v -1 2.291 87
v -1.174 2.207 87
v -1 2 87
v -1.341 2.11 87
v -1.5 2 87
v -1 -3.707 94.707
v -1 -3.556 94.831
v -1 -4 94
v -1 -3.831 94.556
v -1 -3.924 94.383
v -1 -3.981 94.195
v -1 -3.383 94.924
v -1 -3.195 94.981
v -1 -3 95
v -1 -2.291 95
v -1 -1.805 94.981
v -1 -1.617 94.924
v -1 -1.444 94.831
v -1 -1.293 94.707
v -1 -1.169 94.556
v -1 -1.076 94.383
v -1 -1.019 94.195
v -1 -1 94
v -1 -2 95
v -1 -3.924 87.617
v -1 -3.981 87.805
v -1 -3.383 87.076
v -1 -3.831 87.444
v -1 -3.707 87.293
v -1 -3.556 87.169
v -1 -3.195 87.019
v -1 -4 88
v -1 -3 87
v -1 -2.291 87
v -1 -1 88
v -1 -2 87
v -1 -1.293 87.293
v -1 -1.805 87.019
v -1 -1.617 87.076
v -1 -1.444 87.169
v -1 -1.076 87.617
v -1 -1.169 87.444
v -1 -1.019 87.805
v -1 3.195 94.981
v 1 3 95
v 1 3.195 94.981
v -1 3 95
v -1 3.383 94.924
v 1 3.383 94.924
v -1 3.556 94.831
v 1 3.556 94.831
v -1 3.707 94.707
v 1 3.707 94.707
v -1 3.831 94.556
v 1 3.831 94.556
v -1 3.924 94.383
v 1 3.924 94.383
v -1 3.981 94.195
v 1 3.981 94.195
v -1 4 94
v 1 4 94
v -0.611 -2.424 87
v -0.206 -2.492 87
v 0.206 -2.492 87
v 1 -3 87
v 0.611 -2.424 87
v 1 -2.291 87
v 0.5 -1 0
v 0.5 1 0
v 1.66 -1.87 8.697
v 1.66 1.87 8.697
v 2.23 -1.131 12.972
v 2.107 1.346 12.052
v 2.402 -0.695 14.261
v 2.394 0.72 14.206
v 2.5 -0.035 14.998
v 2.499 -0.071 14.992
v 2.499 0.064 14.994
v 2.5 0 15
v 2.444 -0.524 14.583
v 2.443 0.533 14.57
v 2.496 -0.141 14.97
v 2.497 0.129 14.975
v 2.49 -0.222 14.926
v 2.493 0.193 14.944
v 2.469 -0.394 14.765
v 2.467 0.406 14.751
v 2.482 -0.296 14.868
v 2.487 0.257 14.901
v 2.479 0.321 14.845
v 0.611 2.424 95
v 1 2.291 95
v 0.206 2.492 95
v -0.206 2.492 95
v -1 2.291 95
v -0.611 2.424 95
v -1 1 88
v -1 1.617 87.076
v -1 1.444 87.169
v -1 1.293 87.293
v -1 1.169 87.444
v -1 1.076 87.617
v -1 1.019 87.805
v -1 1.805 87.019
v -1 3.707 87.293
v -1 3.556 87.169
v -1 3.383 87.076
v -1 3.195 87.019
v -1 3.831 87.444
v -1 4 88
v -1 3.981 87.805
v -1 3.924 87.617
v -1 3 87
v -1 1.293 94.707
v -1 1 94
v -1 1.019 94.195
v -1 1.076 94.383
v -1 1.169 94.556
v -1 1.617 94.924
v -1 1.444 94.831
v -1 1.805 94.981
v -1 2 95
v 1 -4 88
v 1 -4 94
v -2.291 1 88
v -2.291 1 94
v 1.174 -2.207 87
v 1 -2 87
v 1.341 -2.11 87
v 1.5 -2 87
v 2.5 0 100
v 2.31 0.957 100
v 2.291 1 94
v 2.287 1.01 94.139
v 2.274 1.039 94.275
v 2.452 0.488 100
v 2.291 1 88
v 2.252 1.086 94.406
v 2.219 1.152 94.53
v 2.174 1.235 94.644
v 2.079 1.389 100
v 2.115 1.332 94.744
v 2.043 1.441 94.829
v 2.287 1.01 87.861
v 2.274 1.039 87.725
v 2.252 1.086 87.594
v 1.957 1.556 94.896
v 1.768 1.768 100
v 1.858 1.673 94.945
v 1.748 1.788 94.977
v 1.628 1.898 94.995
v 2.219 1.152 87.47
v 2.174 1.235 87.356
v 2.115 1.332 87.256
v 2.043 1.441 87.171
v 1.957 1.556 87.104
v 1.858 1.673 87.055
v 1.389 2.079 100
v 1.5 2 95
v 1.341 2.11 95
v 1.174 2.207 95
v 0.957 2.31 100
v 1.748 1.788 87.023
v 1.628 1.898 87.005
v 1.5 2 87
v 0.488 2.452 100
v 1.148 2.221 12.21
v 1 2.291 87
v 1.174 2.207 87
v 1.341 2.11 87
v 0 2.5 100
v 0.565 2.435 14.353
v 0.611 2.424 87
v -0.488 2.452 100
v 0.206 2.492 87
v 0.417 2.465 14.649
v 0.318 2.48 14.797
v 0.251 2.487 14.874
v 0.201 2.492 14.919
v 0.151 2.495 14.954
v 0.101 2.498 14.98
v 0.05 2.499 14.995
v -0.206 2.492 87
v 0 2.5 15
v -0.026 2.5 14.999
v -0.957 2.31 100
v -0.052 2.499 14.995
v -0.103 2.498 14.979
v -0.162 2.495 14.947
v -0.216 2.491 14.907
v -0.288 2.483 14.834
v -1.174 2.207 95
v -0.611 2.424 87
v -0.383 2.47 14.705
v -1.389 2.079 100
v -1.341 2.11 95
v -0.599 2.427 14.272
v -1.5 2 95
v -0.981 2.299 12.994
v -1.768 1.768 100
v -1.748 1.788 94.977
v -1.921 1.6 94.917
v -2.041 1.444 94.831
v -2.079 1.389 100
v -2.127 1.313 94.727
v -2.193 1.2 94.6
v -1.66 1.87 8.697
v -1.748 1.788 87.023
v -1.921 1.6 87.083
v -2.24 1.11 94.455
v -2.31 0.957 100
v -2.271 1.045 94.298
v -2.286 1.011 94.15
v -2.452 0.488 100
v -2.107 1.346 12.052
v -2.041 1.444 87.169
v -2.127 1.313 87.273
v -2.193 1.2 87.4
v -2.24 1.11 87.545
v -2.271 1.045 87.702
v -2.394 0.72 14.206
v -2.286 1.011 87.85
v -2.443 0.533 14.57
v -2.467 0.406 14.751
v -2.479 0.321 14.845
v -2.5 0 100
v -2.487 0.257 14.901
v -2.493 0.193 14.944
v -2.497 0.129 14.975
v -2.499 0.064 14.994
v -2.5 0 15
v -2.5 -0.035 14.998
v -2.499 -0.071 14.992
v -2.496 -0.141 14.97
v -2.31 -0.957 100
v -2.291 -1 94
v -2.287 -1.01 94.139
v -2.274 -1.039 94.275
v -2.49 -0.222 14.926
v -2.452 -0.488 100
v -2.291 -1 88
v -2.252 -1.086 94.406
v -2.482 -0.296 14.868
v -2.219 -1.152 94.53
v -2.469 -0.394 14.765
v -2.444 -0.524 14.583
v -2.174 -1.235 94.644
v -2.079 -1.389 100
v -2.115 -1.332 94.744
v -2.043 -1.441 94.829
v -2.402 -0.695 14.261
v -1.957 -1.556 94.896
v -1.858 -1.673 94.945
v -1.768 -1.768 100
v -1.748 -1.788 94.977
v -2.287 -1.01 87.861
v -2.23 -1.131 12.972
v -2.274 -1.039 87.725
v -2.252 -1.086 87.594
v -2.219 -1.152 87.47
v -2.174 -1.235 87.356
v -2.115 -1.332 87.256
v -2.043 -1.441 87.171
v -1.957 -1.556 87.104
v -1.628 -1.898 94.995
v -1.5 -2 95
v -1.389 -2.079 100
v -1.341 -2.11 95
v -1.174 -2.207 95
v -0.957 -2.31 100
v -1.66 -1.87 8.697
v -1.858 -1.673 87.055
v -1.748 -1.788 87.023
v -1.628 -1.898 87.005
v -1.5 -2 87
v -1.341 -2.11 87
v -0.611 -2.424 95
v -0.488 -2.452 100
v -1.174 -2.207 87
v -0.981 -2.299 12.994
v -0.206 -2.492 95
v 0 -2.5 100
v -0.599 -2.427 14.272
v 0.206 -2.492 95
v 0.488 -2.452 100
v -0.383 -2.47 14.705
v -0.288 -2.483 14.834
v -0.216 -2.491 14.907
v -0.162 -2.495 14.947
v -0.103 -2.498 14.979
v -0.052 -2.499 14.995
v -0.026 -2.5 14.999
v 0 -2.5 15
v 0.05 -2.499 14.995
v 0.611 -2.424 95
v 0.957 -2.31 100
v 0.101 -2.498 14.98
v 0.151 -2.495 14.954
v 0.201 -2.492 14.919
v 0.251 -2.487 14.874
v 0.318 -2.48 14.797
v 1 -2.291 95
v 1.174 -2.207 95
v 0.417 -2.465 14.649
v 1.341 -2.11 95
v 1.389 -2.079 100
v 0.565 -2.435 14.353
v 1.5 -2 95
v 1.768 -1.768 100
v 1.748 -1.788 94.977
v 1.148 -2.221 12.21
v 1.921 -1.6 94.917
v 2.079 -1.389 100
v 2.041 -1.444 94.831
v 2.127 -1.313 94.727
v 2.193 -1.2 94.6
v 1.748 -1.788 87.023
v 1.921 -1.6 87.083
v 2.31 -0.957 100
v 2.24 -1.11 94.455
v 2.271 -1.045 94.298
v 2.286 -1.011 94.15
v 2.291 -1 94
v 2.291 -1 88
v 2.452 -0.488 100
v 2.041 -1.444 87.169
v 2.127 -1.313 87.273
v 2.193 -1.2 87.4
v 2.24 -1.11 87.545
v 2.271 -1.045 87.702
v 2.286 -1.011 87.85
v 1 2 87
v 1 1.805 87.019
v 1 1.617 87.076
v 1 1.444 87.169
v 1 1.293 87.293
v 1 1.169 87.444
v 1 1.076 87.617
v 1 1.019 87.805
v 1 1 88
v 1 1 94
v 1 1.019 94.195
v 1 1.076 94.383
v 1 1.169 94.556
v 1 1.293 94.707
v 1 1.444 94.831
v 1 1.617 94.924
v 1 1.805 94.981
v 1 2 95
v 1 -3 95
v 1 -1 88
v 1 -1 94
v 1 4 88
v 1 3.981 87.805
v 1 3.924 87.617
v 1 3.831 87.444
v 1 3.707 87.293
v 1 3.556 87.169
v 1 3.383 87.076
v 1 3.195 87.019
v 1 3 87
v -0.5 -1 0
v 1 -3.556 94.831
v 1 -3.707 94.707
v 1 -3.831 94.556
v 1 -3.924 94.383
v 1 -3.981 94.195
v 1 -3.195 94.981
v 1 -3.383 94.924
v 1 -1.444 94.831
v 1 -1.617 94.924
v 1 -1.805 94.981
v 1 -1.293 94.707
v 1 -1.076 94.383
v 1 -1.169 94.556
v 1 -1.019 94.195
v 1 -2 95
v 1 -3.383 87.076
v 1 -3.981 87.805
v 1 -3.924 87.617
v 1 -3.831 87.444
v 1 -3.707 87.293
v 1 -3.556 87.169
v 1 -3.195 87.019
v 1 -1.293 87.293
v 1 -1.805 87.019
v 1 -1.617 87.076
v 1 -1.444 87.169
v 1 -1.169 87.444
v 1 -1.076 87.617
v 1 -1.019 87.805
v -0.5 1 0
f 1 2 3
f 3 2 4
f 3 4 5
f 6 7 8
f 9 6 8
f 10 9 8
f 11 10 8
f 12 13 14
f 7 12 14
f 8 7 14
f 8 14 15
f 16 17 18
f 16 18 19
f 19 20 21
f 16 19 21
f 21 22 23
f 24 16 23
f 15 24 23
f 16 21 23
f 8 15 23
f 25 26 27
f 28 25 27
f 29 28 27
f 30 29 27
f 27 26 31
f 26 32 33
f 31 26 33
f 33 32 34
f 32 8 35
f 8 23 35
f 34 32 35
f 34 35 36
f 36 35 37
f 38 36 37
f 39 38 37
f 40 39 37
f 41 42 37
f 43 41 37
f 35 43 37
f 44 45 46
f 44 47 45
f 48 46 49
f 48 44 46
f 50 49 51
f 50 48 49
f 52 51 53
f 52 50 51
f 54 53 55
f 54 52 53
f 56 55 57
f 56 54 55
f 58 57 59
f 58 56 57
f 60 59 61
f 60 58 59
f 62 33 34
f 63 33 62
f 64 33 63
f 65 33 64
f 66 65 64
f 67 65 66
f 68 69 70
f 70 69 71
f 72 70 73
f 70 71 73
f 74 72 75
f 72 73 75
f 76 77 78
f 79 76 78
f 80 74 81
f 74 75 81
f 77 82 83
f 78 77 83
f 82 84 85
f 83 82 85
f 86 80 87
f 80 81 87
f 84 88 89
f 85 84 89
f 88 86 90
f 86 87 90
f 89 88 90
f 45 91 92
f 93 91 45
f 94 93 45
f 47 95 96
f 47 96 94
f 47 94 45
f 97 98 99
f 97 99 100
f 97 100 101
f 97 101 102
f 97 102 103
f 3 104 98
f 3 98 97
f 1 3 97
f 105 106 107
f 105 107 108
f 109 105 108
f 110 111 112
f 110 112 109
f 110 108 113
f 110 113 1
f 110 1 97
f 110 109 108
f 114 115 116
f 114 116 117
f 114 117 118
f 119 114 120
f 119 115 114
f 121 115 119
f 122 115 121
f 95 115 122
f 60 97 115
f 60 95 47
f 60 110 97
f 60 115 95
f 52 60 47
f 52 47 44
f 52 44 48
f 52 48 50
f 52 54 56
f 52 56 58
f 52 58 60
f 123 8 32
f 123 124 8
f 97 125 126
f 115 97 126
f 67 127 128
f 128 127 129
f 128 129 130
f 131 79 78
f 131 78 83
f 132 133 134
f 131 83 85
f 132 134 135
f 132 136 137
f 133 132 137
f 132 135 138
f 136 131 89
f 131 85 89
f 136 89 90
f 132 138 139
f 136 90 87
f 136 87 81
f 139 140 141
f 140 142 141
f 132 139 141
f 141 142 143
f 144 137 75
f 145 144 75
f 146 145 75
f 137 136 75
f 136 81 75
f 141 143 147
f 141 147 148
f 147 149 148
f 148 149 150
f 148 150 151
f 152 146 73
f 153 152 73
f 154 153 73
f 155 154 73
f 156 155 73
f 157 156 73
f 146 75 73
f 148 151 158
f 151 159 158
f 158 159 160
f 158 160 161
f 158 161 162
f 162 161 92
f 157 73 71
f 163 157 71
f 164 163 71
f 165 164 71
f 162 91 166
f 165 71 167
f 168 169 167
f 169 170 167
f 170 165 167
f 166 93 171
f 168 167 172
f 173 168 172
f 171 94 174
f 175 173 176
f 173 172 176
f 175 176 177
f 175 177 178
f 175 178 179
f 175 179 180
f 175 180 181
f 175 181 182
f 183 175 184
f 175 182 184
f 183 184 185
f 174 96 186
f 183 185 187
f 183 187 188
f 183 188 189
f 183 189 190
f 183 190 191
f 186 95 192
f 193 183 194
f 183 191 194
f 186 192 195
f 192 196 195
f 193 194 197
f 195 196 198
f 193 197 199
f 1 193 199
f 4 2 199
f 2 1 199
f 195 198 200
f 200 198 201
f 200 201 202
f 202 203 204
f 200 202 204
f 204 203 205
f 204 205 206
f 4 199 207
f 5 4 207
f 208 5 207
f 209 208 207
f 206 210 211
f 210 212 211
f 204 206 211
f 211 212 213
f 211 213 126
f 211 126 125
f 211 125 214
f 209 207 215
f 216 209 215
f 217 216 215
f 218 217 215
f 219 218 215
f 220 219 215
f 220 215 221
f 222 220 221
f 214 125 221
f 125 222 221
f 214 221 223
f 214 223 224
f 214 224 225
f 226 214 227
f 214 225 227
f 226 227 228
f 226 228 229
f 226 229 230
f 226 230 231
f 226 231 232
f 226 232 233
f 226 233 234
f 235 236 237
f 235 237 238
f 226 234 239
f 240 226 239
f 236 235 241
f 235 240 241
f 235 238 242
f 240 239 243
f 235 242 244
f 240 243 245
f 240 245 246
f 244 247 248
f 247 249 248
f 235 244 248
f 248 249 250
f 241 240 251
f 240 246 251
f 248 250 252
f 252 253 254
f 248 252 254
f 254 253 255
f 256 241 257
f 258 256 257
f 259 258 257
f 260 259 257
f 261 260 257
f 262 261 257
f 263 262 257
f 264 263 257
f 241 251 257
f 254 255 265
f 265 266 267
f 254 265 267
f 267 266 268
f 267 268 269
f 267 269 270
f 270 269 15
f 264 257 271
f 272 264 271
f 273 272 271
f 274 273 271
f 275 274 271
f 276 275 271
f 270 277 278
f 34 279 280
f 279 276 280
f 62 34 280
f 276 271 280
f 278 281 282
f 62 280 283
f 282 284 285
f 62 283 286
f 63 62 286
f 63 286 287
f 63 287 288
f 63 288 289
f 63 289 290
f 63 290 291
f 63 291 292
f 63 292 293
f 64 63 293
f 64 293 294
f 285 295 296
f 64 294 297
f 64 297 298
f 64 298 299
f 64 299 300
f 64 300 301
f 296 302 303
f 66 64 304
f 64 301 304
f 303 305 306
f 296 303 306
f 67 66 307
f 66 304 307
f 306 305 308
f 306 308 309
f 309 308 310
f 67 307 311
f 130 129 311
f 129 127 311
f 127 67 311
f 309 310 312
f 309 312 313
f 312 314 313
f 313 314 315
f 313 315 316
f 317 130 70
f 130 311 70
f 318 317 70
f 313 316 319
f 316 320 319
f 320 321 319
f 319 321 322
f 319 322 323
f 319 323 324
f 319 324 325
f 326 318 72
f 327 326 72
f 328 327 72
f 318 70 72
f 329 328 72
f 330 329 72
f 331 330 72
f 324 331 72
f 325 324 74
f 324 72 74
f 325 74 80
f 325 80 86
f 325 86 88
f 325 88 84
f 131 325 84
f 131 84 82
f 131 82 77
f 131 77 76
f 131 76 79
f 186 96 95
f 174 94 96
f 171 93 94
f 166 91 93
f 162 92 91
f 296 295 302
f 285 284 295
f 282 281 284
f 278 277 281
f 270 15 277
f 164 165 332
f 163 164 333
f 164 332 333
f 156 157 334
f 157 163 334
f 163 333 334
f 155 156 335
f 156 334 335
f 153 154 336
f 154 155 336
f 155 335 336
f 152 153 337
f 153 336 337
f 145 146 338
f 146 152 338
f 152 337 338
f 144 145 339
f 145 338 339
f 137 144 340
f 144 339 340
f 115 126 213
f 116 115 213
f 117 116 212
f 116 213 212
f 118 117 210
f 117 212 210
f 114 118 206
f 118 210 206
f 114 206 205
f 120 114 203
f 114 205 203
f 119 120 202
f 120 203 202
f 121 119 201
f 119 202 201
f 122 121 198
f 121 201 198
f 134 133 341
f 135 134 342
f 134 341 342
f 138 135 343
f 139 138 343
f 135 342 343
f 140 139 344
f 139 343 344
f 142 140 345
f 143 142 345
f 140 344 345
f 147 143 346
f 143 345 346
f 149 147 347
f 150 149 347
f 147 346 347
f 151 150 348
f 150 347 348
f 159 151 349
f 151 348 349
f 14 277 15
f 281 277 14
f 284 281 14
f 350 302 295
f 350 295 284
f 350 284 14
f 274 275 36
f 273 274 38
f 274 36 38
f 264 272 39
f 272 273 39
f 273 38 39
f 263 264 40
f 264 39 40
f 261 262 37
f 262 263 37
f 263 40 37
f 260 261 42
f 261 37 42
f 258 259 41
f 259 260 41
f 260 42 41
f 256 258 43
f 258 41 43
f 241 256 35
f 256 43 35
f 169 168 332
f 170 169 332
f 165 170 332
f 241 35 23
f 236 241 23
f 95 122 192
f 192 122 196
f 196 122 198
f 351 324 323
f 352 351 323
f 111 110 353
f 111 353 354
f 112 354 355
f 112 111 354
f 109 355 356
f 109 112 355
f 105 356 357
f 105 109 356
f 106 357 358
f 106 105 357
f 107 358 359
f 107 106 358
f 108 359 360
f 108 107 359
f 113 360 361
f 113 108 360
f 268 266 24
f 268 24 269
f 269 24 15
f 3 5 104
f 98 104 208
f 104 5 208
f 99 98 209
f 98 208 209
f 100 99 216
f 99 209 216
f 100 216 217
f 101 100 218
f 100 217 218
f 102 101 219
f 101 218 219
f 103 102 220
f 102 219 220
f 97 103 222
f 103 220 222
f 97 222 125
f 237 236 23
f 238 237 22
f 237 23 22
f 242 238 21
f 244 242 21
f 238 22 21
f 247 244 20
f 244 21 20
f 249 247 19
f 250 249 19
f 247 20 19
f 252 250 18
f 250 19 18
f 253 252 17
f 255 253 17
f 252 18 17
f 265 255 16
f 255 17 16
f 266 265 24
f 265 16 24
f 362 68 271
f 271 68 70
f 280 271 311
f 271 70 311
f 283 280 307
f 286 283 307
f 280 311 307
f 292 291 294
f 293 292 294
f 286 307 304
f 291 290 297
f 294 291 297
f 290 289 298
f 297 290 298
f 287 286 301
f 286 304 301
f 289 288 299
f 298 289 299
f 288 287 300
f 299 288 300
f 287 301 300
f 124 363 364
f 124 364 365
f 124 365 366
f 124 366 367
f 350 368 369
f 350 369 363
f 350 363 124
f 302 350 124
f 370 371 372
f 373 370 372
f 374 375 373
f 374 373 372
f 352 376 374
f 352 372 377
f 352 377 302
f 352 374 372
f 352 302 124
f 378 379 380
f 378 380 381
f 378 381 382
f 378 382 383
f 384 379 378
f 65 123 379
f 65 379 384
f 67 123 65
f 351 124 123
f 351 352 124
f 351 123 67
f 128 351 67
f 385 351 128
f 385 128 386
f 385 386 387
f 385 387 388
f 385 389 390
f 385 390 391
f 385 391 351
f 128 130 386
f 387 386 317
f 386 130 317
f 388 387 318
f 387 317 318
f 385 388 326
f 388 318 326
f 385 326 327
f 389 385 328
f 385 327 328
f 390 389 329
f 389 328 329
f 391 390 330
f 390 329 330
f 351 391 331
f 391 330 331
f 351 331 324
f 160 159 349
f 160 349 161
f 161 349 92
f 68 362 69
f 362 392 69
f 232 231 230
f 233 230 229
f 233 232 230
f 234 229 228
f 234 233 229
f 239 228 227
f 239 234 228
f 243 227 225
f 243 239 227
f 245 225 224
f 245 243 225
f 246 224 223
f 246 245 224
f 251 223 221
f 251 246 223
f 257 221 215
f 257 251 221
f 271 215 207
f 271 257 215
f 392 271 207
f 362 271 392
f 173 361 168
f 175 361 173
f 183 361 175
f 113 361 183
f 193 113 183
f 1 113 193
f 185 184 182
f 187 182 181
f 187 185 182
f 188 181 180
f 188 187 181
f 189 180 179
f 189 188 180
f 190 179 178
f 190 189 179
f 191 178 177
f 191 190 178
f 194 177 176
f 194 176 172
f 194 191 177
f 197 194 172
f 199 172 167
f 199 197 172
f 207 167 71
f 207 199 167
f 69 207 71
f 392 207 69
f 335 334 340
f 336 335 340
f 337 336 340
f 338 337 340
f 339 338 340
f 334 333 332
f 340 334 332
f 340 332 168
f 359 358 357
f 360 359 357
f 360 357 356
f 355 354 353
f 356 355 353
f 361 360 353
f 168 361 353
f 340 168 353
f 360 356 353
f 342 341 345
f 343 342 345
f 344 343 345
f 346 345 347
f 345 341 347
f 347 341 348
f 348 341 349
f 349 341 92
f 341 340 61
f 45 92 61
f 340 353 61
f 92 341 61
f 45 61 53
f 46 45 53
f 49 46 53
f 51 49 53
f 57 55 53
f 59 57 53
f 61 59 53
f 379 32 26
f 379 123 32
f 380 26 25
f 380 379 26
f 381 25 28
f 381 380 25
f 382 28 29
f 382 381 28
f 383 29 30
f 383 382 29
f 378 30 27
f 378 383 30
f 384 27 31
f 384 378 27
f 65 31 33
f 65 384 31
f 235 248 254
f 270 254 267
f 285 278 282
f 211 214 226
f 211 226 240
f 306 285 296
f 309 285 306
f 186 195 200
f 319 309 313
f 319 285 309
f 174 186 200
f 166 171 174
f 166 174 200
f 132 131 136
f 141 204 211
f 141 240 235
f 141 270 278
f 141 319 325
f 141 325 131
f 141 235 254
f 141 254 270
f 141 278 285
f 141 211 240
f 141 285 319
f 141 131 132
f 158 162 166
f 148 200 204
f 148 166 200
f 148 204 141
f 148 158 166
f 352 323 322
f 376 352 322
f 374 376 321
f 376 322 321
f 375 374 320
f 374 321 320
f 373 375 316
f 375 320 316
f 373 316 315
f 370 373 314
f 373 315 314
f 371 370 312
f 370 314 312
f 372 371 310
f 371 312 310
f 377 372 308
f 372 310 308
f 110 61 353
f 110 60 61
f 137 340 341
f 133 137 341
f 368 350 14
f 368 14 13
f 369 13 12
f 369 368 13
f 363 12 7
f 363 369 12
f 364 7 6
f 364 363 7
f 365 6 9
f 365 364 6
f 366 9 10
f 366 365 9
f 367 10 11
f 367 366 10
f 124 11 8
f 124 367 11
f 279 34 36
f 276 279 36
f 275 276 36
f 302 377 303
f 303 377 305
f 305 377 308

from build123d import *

# Parameters (mm, degrees)
SKETCH1_R           = 2.5
BOSS_EXTRUDE1_DEPTH = 100
CUT_EXTRUDE1_DEPTH  = 5
BOSS_EXTRUDE2_DEPTH = 1
CUT_EXTRUDE2_DEPTH  = 6
CUT_EXTRUDE3_DEPTH  = 2.5


with BuildPart() as part:
    # Sketch1 → Boss-Extrude1 (new body)
    with BuildSketch(Plane.XY):
        Circle(SKETCH1_R)
    extrude(amount=BOSS_EXTRUDE1_DEPTH)

    # Sketch2 → Cut-Extrude1 (cut, symmetric)
    with BuildSketch(Plane(origin=(0, 0, 0), x_dir=(0, 0, -1), z_dir=(1, 0, 0))):
        with BuildLine():
            Line((-94, 4), (-88, 4))
            ThreePointArc((-88, 4), (-87.292893219, 3.707106781), (-87, 3))
            Line((-87, 3), (-87, 2))
            ThreePointArc((-87, 2), (-87.292893219, 1.292893219), (-88, 1))
            Line((-88, 1), (-94, 1))
            ThreePointArc((-94, 1), (-94.707106781, 1.292893219), (-95, 2))
            Line((-95, 2), (-95, 3))
            ThreePointArc((-95, 3), (-94.707106781, 3.707106781), (-94, 4))
        make_face()
        with BuildLine():
            Line((-87, -3), (-87, -2))
            ThreePointArc((-87, -2), (-87.292893219, -1.292893219), (-88, -1))
            Line((-88, -1), (-94, -1))
            ThreePointArc((-94, -1), (-94.707106781, -1.292893219), (-95, -2))
            Line((-95, -2), (-95, -3))
            ThreePointArc((-95, -3), (-94.707106781, -3.707106781), (-94, -4))
            Line((-94, -4), (-88, -4))
            ThreePointArc((-88, -4), (-87.292893219, -3.707106781), (-87, -3))
        make_face()
    extrude(amount=CUT_EXTRUDE1_DEPTH, both=True, mode=Mode.SUBTRACT)

    # Sketch2<2> → Boss-Extrude2 (add, symmetric)
    with BuildSketch(Plane(origin=(0, 0, 0), x_dir=(0, 0, -1), z_dir=(1, 0, 0))):
        with BuildLine():
            Line((-94, 4), (-88, 4))
            ThreePointArc((-88, 4), (-87.292893219, 3.707106781), (-87, 3))
            Line((-87, 3), (-87, 2))
            ThreePointArc((-87, 2), (-87.292893219, 1.292893219), (-88, 1))
            Line((-88, 1), (-94, 1))
            ThreePointArc((-94, 1), (-94.707106781, 1.292893219), (-95, 2))
            Line((-95, 2), (-95, 3))
            ThreePointArc((-95, 3), (-94.707106781, 3.707106781), (-94, 4))
        make_face()
        with BuildLine():
            Line((-87, -3), (-87, -2))
            ThreePointArc((-87, -2), (-87.292893219, -1.292893219), (-88, -1))
            Line((-88, -1), (-94, -1))
            ThreePointArc((-94, -1), (-94.707106781, -1.292893219), (-95, -2))
            Line((-95, -2), (-95, -3))
            ThreePointArc((-95, -3), (-94.707106781, -3.707106781), (-94, -4))
            Line((-94, -4), (-88, -4))
            ThreePointArc((-88, -4), (-87.292893219, -3.707106781), (-87, -3))
        make_face()
    extrude(amount=BOSS_EXTRUDE2_DEPTH, both=True)

    # Sketch3 → Cut-Extrude2 (cut, symmetric)
    with BuildSketch(Plane(origin=(0, 0, 0), x_dir=(0, 0, -1), z_dir=(1, 0, 0))):
        Polygon((-15, 2.5), (0, 1), (0, 2.5), align=None)
        Polygon((0, -2.5), (0, -1), (-15, -2.5), align=None)
    extrude(amount=CUT_EXTRUDE2_DEPTH, both=True, mode=Mode.SUBTRACT)

    # Sketch4 → Cut-Extrude3 (cut, symmetric)
    with BuildSketch(Plane(origin=(0, 0, 0), x_dir=(1, 0, 0), z_dir=(0, 1, 0))):
        Polygon((-2.5, -15), (-0.5, 0), (-2.5, 0), align=None)
        Polygon((2.5, 0), (0.5, 0), (2.5, -15), align=None)
    extrude(amount=CUT_EXTRUDE3_DEPTH, both=True, mode=Mode.SUBTRACT)


solid = part.part
